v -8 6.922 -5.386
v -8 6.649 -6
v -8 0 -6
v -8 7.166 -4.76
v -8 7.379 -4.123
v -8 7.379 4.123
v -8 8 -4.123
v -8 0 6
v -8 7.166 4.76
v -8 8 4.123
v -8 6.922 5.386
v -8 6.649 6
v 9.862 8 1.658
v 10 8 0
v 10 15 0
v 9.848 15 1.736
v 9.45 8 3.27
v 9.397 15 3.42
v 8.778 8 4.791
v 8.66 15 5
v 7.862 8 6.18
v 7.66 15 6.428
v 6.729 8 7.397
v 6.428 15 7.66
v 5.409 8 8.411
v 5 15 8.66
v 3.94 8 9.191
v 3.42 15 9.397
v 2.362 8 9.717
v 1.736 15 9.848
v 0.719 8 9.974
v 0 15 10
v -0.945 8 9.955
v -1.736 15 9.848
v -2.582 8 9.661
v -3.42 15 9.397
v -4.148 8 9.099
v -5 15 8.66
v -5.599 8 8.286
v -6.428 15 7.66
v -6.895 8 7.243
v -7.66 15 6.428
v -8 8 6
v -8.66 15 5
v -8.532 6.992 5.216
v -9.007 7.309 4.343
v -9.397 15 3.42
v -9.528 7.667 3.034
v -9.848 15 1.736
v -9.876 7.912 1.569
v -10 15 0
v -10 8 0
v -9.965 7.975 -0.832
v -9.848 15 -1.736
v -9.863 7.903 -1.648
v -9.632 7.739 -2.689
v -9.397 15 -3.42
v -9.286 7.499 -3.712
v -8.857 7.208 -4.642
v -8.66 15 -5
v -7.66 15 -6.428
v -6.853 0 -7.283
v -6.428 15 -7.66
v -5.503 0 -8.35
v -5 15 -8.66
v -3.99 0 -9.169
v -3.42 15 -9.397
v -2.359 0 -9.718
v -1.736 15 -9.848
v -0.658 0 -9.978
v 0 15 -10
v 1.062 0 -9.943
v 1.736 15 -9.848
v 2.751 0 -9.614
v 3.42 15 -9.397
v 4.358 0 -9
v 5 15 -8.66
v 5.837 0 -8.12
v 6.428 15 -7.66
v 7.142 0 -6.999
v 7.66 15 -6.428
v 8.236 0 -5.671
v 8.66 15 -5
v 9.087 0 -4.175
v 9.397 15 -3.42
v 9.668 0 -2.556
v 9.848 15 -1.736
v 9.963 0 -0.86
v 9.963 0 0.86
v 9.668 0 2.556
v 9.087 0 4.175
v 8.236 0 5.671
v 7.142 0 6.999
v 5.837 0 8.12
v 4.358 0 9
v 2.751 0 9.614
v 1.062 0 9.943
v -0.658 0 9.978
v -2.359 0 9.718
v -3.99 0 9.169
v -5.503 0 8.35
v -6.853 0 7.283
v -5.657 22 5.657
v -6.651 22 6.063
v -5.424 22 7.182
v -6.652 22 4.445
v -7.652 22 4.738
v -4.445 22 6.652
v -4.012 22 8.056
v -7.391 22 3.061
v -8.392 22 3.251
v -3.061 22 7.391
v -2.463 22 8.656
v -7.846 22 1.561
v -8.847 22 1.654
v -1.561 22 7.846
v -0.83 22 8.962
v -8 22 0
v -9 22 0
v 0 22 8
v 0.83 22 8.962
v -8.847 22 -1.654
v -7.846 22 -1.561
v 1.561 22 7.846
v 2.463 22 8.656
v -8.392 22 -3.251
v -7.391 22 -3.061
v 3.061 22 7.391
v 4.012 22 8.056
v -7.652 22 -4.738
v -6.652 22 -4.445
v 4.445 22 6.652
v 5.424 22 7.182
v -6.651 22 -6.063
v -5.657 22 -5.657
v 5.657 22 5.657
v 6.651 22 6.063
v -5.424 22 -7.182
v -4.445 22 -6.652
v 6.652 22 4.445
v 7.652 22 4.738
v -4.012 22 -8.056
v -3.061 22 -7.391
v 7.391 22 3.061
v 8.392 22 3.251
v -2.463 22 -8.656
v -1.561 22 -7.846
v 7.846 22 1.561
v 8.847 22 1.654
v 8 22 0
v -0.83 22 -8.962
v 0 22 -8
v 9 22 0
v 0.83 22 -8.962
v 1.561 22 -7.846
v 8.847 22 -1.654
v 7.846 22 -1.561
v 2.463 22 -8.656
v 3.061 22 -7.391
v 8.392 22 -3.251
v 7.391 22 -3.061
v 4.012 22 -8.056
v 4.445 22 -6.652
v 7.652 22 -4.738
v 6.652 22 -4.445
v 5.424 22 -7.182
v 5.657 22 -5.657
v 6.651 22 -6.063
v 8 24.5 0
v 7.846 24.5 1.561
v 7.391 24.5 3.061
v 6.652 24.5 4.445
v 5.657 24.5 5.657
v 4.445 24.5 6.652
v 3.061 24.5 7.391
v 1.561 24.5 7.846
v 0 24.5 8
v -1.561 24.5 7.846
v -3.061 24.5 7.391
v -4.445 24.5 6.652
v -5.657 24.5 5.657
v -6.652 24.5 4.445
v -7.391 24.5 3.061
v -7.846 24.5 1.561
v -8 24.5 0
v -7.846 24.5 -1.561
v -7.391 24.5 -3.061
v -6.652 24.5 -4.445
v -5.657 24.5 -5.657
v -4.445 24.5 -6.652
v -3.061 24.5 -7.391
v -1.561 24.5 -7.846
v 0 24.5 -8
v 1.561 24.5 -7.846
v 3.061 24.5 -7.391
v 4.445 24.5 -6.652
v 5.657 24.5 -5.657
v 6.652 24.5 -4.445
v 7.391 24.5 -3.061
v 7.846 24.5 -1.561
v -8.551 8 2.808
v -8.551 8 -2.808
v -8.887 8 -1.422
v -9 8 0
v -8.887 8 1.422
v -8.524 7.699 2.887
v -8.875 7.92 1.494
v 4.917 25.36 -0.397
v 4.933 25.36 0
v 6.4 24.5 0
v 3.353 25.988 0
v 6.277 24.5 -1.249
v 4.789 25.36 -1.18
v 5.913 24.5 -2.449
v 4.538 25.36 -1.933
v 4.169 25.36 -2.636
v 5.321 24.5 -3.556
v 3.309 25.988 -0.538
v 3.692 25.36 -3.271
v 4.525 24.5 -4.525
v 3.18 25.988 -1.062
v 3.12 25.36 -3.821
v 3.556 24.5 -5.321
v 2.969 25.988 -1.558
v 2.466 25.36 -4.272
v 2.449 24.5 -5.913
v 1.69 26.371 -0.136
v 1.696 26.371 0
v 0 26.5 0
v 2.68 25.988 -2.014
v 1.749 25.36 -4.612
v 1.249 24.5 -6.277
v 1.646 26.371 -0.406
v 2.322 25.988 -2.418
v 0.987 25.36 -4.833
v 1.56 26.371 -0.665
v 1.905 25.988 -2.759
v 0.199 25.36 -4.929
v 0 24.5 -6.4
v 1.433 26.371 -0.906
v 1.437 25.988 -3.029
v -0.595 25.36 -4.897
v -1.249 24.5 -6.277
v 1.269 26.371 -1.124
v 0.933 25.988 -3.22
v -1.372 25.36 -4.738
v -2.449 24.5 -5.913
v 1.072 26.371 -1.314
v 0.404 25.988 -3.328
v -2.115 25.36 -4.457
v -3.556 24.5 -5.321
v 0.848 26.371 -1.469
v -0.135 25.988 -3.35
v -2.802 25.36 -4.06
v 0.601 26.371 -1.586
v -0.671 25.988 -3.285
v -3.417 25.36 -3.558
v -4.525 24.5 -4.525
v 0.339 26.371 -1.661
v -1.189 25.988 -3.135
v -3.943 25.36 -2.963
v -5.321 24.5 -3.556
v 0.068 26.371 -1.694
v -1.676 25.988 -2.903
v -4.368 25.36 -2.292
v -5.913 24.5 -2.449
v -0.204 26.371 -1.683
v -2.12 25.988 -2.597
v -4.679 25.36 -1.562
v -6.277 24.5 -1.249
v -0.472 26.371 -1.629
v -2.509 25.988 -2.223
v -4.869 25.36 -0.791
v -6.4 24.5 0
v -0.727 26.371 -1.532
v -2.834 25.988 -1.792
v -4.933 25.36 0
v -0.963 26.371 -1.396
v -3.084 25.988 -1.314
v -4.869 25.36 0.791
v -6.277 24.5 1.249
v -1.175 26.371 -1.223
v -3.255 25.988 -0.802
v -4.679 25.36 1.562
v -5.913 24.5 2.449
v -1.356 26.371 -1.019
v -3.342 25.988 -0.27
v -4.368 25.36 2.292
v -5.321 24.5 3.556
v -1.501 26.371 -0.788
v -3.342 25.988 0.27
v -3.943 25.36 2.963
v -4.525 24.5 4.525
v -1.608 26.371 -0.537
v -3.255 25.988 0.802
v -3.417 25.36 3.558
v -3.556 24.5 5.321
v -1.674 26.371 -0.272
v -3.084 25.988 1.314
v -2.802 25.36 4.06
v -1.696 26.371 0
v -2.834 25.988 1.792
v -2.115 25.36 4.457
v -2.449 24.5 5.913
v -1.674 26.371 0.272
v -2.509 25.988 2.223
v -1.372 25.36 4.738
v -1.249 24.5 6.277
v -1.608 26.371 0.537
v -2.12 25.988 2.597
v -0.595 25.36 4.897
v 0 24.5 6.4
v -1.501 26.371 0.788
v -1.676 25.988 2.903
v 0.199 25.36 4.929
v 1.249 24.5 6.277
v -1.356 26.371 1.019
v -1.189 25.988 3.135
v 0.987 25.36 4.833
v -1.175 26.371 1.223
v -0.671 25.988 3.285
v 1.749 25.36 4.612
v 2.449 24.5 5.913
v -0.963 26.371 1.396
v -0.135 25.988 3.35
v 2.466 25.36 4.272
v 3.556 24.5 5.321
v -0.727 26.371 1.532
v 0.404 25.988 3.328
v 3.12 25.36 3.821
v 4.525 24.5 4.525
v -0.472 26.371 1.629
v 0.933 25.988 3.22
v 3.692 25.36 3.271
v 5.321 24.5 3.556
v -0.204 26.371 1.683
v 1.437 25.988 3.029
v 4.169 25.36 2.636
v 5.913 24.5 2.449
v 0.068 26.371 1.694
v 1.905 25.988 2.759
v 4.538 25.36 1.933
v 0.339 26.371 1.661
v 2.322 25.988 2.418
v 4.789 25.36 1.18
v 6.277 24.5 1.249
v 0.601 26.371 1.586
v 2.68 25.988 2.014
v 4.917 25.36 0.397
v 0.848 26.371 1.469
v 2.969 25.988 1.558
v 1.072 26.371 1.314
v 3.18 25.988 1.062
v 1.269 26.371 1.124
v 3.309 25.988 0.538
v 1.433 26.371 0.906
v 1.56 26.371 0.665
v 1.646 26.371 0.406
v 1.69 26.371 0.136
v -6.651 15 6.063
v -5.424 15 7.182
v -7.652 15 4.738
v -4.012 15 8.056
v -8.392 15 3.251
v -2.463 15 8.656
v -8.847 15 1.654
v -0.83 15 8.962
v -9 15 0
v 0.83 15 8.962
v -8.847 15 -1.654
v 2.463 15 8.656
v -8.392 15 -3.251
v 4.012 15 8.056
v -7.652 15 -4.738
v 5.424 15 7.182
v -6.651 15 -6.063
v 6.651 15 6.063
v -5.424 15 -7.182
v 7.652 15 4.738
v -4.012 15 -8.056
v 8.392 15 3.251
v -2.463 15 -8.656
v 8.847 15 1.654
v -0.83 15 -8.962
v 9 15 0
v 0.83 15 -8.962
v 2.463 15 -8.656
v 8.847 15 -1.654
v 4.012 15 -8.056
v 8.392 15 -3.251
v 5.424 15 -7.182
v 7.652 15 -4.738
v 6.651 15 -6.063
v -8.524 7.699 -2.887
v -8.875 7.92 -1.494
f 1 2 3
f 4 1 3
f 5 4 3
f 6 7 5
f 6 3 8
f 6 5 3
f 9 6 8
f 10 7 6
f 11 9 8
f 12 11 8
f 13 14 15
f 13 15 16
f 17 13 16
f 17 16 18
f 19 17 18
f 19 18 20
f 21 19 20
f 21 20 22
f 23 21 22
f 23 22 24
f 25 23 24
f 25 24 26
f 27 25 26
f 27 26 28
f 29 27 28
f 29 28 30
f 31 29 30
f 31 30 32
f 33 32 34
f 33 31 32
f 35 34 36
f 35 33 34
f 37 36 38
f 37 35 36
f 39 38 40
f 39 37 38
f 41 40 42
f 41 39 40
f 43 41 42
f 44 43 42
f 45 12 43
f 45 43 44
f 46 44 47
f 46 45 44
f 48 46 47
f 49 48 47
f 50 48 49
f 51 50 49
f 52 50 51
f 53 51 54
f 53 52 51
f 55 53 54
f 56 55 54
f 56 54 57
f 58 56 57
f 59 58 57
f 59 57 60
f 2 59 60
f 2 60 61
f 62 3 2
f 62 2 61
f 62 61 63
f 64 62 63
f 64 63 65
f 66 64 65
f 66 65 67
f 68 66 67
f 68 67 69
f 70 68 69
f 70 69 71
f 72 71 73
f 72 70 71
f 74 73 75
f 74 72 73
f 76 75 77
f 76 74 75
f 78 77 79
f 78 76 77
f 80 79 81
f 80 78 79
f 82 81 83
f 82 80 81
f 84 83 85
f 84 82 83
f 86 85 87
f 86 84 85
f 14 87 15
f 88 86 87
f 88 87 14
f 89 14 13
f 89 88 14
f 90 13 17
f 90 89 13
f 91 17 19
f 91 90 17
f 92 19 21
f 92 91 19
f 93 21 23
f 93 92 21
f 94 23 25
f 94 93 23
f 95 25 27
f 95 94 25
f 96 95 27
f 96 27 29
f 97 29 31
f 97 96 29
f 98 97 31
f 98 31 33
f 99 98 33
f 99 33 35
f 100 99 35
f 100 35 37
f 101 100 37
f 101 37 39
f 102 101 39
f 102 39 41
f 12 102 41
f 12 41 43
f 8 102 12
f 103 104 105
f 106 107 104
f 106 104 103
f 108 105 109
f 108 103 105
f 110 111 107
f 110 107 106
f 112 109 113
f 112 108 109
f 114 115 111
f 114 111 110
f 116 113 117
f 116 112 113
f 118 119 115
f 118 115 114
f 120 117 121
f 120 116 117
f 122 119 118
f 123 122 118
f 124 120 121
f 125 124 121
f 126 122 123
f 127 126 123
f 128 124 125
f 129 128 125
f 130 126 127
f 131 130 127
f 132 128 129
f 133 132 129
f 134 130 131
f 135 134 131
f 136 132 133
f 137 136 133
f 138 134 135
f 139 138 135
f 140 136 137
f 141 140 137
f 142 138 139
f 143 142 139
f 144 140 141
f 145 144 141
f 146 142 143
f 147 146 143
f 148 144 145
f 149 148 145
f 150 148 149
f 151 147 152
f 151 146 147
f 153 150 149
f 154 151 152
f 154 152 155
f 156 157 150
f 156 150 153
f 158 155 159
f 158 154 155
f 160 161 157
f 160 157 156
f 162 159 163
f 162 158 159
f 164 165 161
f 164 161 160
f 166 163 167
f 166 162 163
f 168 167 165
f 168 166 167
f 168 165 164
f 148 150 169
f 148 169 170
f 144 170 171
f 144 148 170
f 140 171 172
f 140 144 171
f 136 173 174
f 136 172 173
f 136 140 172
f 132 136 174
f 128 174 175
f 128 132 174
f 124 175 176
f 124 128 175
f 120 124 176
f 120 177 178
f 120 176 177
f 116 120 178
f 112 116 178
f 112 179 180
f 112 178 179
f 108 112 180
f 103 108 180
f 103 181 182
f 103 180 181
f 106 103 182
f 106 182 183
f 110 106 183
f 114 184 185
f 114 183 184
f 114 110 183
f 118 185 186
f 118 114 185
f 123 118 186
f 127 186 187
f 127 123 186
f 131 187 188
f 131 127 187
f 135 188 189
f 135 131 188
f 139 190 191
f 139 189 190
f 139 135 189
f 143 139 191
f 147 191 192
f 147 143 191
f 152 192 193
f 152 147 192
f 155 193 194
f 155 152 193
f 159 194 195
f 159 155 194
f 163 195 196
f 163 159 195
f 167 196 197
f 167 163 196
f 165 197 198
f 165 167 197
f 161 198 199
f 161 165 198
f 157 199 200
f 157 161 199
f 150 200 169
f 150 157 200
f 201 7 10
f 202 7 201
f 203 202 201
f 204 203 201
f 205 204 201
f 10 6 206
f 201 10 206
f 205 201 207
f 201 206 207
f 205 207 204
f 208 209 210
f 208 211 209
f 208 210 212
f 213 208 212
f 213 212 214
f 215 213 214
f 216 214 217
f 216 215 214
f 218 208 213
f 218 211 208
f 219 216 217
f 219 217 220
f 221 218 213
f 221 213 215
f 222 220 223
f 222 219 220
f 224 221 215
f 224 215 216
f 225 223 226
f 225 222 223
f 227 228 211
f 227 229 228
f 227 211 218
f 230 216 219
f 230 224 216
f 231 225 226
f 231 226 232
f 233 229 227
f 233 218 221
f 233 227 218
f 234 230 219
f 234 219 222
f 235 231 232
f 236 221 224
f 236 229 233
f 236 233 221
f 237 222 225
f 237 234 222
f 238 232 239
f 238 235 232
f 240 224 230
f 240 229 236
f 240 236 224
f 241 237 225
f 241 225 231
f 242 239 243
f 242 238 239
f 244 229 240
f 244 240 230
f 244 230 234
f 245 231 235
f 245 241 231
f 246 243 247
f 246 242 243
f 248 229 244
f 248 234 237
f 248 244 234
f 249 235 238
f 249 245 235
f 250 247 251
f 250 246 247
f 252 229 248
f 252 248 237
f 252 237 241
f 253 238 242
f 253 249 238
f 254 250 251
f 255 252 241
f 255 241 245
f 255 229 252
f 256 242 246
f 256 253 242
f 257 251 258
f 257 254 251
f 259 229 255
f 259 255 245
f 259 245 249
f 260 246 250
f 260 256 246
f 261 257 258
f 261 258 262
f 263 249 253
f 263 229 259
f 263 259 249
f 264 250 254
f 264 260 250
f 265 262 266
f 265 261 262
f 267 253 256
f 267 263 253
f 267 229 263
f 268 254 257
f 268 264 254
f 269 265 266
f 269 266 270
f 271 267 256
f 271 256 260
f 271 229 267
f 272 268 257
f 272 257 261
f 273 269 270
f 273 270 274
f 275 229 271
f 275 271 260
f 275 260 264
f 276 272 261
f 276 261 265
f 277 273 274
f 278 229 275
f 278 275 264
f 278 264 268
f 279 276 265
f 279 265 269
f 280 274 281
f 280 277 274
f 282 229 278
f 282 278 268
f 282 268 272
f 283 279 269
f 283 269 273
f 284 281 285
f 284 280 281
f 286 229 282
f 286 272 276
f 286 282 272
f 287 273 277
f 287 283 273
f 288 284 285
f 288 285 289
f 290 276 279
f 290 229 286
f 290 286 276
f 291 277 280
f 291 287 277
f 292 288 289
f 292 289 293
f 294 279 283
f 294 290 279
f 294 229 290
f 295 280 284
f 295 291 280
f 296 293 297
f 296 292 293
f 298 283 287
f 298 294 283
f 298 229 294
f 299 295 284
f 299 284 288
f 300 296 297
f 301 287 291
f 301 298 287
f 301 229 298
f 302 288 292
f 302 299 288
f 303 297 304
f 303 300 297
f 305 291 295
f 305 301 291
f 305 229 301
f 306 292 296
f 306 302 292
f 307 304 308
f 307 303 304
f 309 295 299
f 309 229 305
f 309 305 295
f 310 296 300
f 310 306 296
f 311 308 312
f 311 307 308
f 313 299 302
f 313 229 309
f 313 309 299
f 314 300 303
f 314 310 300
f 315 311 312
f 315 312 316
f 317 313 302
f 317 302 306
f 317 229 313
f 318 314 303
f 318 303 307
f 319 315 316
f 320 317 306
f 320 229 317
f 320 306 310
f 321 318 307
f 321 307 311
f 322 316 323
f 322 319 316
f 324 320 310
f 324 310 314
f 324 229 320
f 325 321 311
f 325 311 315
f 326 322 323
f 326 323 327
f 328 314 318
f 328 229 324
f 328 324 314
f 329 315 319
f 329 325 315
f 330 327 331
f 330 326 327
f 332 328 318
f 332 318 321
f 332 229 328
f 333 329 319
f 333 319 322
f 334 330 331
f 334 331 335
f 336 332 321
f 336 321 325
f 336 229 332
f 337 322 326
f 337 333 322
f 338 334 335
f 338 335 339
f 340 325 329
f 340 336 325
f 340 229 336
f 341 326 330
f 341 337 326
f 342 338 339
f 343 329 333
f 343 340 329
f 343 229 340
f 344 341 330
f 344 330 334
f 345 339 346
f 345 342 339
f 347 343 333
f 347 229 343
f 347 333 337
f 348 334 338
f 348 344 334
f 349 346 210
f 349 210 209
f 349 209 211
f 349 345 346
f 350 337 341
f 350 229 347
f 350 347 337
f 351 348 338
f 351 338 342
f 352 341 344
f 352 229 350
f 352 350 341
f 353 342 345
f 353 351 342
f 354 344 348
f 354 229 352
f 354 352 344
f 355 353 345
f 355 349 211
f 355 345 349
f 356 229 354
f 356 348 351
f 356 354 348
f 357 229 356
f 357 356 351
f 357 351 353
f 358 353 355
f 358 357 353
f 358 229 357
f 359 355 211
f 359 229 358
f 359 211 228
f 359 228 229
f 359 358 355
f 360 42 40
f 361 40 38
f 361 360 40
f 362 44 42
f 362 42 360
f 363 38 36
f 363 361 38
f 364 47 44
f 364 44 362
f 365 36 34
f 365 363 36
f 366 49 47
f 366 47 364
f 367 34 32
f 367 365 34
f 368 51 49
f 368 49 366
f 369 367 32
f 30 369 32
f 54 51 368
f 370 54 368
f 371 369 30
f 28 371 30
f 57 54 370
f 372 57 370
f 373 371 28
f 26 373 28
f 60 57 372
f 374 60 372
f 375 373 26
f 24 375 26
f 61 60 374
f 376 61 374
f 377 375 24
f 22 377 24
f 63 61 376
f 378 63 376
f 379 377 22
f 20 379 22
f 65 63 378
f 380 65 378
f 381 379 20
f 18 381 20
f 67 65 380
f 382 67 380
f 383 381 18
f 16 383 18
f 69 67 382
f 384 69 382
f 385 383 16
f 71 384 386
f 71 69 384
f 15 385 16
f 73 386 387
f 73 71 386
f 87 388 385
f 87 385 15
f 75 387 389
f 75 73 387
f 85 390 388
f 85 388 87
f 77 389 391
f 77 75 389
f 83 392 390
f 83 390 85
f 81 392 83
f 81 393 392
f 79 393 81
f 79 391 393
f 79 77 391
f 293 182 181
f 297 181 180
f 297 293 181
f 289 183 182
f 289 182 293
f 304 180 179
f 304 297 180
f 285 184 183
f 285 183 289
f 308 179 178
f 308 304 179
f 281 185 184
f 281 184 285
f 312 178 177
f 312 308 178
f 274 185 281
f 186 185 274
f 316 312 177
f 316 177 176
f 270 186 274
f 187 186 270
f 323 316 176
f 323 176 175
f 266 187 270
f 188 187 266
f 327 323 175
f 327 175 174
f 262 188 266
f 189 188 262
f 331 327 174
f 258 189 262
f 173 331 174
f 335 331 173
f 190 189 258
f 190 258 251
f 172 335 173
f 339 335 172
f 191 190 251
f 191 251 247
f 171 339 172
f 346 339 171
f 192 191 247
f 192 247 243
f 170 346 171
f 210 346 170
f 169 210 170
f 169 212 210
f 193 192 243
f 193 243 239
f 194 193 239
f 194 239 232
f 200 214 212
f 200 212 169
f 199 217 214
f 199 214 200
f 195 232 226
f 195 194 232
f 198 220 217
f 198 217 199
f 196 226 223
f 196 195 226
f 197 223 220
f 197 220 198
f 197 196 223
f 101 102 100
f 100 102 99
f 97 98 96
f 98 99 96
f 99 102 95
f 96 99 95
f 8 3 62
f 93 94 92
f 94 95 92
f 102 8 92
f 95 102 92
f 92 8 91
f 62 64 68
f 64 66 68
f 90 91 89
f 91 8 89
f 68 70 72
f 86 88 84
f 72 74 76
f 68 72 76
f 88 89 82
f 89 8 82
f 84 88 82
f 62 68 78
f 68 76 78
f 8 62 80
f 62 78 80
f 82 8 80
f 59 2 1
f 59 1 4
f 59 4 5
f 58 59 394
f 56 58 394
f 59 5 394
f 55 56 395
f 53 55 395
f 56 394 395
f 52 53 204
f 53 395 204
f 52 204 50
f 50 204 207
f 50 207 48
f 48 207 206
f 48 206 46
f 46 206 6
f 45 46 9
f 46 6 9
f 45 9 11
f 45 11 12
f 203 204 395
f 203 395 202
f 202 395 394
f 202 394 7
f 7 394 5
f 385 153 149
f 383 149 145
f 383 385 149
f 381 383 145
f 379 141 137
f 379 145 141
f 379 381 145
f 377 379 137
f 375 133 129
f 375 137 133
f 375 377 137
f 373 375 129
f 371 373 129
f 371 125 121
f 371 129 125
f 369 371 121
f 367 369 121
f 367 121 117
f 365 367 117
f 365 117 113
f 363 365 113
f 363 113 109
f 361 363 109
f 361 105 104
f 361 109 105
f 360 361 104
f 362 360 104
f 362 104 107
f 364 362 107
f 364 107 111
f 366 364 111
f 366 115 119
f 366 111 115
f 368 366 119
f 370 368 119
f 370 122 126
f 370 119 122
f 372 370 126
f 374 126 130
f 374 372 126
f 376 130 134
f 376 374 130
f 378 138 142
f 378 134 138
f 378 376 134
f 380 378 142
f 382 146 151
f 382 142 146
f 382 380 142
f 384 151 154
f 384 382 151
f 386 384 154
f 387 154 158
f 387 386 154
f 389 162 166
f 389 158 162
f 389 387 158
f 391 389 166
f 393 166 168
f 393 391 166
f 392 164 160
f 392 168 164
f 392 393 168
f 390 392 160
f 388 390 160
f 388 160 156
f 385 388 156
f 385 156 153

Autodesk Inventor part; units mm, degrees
ref_plane "YZ Plane" through (0, 0, 0) normal (1, 0, 0) x (0, 1, 0)
ref_plane "XZ Plane" through (0, 0, 0) normal (0, 1, 0) x (-1, 0, 0)
ref_plane "XY Plane" through (0, 0, 0) normal (0, 0, 1) x (1, 0, 0)
sketch "Sketch1" plane through (0, 0, 0) normal (0, 1, 0) x (-1, 0, 0)
  arc A0 (8, 6) -> (8, -6) centre (0, 0) ccw
  arc A1 (7, 5.6569) -> (7, -5.6569) centre (0, 0) ccw
  line L0 (8, 0) -> (8, -6)
  line L1 (8, 6) -> (8, 0)
  line L2 (7, -5.6569) -> (7, 5.6569)
  dimension "d0" = 20
  dimension "d1" = 1
extrude "Extrusion1" add sketch "Sketch1" along normal blind 8
sketch "Sketch2" plane through (0, 0, 0) normal (0, -1, 0) x (1, 0, 0)
  point P0 (0, 0)
sketch "Sketch3" plane through (-8, 0, -6) normal (-1, 0, 0) x (0, 0, 1)
  line L0 (0, 8) -> (12, 8) construction
  line L1 (6, 8) -> (6, -6) construction
  circle A0 centre (6, -6) radius 14
  point P0 (6, 0)
  dimension "d7" = 14
sketch "Sketch4" plane through (0, 8, 0) normal (0, 1, 0) x (1, 0, 0)
  circle A0 centre (0, 0) radius 10
  circle A1 centre (0, 0) radius 9
extrude "Extrusion2" add sketch "Sketch4" against normal blind 8
extrude "Extrusion3" cut sketch "Sketch3" along normal blind 8
sketch "Sketch5" plane through (0, 8, 0) normal (0, 1, 0) x (1, 0, 0)
  circle A0 centre (0, 0) radius 10
  circle A1 centre (0, 0) radius 9
extrude "Extrusion4" add sketch "Sketch5" along normal blind 7
sketch "Sketch6" plane through (0, 15, 0) normal (0, 1, 0) x (1, 0, 0)
  circle A0 centre (0, 0) radius 9
  arc A1 (-7, -5.6569) -> (-7, 5.6569) centre (0, 0) ccw projected
  circle A2 centre (0, 0) radius 8
  dimension "d14" = 16
extrude "Extrusion5" add sketch "Sketch6" against normal up to surface (7 mm away)
sketch "Sketch7" plane through (0, 8, 0) normal (0, -1, 0) x (1, 0, 0)
  arc A0 (-8, 4.1231) -> (-9, 0) centre (0, 0) ccw projected
  circle A1 centre (0, 0) radius 9
  circle A2 centre (0, 0) radius 8
  line L0 (-8, -4.1231) -> (-8, 0) projected
  line L1 (-8, 0) -> (-8, 4.1231) projected
  line L2 (-8, -4.1231) -> (-8, 4.1231)
  line L3 (-7, 5.6569) -> (-7, 3.873) projected
  line L4 (-7, -3.873) -> (-7, -5.6569) projected
  line L5 (-7, 5.6569) -> (-7, -5.6569)
extrude "Extrusion6" add sketch "Sketch7" along normal up to surface (8 mm away) contours A1 L4 A2 L3
sketch "Sketch8" plane through (0, 15, 0) normal (0, 1, 0) x (1, 0, 0)
  circle A0 centre (0, 0) radius 9
  circle A1 centre (0, 0) radius 8
  circle A2 centre (0, 0) radius 9
  dimension "d19" = 18
extrude "Extrusion7" add sketch "Sketch8" along normal blind 7
sketch "Sketch9" plane through (0, 22, 0) normal (0, 1, 0) x (1, 0, 0)
  circle A0 centre (0, 0) radius 8
  circle A1 centre (0, 0) radius 7
  dimension "d22" = 14
extrude "Extrusion8" add sketch "Sketch9" against normal up to surface (22 mm away)
sketch "Sketch10" plane through (0, 22, 0) normal (0, 1, 0) x (1, 0, 0)
  circle A0 centre (0, 0) radius 7
  circle A1 centre (0, 0) radius 7 projected
  circle A2 centre (0, 0) radius 8
  dimension "d25" = 16
extrude "Extrusion9" add sketch "Sketch10" along normal blind 2.5
sketch "Sketch11" plane through (0, 24.5, 0) normal (0, 1, 0) x (1, 0, 0)
  circle A0 centre (0, 0) radius 8
  circle A1 centre (0, 0) radius 7
  circle A2 centre (0, 0) radius 7
extrude "Extrusion10" add sketch "Sketch11" against normal up to surface (24.5 mm away) contours A1
sketch "Sketch13" plane through (0, 0, 0) normal (0, 0, 1) x (1, 0, 0)
  line L0 (0, 24.5) -> (6.4, 24.5)
  line L1 (0, 24.5) -> (6.4, 24.5)
  line L2 (0, 26.5) -> (0, 24.5)
  arc A0 (6.4, 24.5) -> (0, 26.5) centre (0, 15.26) ccw
  line L3 (0, 0) -> (0, 24.5)
  line L4 (8, 24.5) -> (-8, 24.5) projected
revolve "Revolution1" add sketch "Sketch13" angle 360 about axis through (0, 26.5, 0) along (0, -1, 0)
properties part number "button 3"
